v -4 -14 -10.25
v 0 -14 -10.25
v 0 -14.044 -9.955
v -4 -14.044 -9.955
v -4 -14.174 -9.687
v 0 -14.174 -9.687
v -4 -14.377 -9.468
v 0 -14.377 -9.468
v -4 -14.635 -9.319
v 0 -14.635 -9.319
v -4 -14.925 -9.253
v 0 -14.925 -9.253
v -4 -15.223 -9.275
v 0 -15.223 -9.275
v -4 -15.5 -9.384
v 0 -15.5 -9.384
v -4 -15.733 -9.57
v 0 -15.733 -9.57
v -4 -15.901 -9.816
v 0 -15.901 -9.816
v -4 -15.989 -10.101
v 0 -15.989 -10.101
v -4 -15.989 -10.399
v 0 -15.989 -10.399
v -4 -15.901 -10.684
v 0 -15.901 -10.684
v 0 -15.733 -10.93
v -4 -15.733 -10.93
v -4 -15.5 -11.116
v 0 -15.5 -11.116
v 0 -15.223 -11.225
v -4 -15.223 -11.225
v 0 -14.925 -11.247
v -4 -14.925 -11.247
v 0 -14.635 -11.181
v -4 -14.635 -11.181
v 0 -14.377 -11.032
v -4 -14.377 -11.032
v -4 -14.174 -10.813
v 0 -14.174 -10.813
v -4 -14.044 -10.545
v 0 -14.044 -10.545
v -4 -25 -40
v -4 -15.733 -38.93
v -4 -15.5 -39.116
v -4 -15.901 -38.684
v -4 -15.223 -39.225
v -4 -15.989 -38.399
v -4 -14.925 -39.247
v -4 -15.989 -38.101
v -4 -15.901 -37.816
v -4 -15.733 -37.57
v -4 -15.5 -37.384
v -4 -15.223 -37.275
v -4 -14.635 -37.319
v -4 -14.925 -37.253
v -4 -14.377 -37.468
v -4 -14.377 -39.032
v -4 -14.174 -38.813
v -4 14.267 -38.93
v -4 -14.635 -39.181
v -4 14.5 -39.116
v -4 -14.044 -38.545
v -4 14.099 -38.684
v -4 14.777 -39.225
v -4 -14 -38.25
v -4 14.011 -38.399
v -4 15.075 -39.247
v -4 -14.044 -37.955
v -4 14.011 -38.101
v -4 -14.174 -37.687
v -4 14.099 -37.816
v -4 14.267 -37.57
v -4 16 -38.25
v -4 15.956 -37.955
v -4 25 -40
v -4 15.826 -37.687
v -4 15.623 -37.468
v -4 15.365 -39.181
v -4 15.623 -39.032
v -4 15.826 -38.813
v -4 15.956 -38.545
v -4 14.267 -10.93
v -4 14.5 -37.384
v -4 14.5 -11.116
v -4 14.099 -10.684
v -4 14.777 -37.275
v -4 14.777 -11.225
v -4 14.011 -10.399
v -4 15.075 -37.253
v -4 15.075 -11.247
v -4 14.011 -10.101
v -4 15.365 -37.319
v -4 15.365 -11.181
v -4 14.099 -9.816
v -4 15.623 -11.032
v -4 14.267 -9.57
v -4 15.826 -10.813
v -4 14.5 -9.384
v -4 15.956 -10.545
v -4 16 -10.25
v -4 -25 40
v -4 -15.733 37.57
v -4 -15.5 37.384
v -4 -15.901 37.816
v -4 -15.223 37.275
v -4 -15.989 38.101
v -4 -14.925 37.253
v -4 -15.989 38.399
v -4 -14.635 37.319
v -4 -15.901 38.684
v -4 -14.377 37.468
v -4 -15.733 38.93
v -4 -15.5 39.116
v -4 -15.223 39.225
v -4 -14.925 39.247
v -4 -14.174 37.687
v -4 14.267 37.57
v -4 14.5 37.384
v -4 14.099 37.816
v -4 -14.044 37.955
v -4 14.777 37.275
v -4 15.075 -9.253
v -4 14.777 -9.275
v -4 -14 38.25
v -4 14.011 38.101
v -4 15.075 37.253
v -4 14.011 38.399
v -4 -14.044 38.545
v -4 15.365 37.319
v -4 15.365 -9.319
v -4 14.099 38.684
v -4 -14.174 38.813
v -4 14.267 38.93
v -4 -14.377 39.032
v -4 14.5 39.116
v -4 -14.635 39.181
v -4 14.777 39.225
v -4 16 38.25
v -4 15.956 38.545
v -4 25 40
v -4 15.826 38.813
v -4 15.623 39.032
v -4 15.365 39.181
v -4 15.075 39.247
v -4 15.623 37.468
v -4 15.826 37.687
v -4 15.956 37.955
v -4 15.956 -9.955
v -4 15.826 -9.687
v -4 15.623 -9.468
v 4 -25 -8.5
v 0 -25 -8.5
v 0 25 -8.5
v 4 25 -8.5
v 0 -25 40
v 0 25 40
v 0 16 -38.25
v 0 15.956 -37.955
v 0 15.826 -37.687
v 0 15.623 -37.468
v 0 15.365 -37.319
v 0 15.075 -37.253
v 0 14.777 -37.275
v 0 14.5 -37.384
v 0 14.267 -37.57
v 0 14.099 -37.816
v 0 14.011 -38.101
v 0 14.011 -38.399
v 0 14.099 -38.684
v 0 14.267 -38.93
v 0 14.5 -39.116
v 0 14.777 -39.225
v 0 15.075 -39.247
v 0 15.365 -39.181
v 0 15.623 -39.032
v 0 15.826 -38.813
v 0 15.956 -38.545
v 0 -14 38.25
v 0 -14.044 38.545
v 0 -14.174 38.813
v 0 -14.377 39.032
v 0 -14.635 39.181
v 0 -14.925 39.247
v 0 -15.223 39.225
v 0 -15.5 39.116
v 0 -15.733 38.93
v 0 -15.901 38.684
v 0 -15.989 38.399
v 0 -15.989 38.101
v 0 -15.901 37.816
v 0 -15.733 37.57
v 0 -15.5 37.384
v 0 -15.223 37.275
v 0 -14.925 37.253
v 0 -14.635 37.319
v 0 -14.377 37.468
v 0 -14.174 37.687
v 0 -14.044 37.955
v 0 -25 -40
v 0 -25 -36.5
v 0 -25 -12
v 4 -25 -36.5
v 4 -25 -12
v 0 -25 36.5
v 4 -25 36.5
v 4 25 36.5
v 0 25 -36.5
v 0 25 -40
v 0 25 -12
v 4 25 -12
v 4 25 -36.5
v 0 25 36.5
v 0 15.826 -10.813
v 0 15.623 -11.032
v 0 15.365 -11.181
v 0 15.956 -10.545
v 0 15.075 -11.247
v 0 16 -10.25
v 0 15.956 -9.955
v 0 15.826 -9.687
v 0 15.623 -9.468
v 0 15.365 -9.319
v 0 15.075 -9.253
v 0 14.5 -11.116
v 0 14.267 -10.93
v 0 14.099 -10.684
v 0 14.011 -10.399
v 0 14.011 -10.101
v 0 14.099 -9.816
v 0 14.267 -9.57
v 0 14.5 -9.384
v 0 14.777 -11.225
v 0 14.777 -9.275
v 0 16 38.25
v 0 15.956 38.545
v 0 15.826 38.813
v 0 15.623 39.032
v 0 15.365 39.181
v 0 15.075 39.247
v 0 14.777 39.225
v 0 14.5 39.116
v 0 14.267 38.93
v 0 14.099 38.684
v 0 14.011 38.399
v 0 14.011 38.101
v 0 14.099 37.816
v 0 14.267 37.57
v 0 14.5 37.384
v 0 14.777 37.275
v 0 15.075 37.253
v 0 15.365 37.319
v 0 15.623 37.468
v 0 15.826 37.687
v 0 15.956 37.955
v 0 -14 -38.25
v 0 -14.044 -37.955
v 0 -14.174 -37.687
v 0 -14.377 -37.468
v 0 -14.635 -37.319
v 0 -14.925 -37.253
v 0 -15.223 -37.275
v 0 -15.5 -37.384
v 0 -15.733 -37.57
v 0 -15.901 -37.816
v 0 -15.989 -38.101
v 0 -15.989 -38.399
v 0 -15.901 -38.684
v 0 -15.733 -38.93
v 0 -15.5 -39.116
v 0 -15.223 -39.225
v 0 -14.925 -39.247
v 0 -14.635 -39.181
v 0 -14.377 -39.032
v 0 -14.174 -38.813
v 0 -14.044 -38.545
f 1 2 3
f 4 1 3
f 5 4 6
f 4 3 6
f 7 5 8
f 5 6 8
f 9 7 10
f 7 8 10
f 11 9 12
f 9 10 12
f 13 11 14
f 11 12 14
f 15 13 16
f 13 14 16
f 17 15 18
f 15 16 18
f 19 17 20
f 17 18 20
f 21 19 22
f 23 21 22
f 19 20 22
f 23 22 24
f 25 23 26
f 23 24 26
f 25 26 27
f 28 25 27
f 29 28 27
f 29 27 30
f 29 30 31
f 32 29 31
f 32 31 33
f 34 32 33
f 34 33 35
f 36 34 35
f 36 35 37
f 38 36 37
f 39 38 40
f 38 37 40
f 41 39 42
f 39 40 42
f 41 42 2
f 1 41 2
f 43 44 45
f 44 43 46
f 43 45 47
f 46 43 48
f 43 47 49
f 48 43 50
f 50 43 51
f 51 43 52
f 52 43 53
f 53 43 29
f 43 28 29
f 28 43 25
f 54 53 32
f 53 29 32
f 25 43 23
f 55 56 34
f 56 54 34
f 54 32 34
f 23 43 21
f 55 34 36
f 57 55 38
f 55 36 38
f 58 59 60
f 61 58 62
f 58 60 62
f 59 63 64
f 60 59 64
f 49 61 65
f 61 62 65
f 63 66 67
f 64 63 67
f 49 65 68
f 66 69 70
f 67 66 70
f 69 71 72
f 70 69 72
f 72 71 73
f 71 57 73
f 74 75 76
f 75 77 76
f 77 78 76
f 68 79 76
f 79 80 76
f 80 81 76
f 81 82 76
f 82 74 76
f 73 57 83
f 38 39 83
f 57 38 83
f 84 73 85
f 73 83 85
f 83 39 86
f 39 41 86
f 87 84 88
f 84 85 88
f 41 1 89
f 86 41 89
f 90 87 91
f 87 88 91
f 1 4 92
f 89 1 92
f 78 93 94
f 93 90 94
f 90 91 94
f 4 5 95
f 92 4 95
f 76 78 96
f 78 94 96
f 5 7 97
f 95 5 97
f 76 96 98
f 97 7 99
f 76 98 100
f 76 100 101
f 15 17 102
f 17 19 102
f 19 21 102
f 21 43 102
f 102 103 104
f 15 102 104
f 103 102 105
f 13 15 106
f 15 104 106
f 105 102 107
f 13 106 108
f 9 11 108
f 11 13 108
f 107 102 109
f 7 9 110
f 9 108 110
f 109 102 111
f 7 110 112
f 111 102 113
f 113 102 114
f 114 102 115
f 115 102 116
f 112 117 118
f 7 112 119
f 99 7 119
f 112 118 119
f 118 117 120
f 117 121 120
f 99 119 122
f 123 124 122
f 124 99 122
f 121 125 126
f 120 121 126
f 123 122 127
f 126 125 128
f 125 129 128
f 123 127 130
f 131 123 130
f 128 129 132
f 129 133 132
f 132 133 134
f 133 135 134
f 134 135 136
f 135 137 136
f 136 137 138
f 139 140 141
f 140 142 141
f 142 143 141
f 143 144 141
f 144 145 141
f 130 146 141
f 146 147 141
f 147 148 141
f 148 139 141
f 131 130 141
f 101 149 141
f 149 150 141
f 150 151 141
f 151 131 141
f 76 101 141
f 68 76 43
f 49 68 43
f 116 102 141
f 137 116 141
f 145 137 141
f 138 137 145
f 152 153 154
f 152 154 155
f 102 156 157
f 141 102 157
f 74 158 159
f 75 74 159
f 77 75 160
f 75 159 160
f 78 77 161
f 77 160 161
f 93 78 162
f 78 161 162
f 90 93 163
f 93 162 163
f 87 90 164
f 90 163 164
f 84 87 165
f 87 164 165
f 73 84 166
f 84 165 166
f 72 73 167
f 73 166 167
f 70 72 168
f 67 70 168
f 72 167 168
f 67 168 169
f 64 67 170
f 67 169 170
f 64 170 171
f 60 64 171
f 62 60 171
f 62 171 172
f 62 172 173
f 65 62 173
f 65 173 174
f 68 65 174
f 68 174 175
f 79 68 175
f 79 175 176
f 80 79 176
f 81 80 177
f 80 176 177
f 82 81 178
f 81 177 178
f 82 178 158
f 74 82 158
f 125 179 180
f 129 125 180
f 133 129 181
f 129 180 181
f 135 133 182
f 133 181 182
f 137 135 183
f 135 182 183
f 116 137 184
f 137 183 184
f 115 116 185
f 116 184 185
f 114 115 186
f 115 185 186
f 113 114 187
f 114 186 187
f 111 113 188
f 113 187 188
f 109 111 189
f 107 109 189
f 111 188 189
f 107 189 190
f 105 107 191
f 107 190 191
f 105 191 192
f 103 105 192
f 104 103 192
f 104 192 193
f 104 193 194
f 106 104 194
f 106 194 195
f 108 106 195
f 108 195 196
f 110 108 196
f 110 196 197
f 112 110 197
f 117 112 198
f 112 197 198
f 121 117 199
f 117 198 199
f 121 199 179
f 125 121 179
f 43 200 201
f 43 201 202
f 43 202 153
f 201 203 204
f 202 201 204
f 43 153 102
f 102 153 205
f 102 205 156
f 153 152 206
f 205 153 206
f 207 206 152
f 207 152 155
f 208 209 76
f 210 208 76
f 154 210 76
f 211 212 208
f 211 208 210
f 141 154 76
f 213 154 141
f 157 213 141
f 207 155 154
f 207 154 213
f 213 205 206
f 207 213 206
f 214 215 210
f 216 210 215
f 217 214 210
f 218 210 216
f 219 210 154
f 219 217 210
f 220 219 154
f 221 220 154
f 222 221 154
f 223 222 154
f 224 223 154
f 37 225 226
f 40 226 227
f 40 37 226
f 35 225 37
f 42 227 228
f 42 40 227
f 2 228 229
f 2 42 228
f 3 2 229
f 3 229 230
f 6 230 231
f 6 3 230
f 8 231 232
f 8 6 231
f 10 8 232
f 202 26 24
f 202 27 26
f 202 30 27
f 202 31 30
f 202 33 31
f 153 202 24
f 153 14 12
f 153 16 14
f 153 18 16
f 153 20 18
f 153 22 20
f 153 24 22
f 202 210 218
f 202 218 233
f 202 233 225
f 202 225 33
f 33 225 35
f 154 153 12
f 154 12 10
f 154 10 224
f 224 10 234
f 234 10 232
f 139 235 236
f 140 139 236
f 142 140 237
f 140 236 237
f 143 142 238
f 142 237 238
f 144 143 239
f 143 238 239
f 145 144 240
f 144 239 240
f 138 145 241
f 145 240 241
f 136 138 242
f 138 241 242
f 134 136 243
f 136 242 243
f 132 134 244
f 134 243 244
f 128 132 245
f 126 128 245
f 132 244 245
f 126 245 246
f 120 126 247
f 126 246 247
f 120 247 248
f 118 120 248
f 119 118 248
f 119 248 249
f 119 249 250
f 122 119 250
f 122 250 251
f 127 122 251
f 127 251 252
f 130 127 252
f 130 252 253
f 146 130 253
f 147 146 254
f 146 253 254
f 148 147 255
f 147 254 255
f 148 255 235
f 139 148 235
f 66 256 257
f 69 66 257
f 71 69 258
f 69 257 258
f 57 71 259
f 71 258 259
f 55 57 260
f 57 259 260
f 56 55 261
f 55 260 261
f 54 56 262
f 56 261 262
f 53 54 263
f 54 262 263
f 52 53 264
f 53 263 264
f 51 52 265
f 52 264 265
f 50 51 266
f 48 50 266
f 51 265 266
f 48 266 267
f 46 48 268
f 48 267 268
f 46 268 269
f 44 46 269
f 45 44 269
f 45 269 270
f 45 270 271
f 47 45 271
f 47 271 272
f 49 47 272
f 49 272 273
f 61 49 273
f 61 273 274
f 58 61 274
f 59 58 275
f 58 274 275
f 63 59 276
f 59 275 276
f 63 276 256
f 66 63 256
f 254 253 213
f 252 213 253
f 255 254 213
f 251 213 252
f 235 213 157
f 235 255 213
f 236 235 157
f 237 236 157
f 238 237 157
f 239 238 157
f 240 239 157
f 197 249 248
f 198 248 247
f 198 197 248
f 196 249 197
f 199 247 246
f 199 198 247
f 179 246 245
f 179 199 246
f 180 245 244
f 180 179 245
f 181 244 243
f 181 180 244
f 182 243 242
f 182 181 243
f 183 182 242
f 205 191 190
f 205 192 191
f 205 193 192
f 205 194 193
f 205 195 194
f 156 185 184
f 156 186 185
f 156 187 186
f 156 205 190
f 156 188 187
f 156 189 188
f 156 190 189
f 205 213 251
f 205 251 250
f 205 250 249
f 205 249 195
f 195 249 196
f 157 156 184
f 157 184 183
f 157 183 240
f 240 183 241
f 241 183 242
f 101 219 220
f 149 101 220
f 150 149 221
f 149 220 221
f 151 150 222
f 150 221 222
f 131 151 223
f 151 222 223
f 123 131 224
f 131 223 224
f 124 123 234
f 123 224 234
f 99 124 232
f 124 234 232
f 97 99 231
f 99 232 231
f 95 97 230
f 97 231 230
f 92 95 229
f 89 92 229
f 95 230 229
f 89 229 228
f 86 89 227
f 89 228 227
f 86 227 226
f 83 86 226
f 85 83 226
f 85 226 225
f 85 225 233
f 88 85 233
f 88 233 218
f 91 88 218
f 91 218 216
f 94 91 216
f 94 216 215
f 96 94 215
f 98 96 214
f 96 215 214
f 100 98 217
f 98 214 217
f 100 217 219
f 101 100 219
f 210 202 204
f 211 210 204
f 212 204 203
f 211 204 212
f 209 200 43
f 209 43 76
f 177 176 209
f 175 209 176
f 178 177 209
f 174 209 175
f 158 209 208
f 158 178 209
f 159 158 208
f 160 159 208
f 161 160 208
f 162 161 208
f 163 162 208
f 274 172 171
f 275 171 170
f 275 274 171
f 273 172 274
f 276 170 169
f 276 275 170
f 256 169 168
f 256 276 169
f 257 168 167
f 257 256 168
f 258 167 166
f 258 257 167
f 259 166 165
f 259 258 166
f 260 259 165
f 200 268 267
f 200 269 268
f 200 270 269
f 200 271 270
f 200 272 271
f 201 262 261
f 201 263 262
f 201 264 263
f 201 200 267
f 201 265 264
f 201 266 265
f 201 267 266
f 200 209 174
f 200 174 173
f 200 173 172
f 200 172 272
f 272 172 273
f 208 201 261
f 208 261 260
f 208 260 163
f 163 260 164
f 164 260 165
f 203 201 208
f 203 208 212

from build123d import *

# Parameters (mm, degrees)
F0_W     = 50
F0_H     = 80
F1_DEPTH = 4
F2_W     = 4
F2_H     = 3.5
F3_DEPTH = 50.001
F4_R     = 1
F5_DEPTH = 4
F6_R     = 1
F7_DEPTH = 4
F8_R     = 1
F9_DEPTH = 4


with BuildPart() as f1:
    # F0 (on Right) → F1 (new body, symmetric)
    with BuildSketch(Plane.YZ):
        Rectangle(F0_W, F0_H)
    extrude(amount=F1_DEPTH, both=True)

    # F2 (on face) → F3 (cut, through all)
    with BuildSketch(Plane.XZ.offset(25)):
        with Locations((2, 38.25)):
            Rectangle(F2_W, F2_H)
        with Locations((2, -10.25)):
            Rectangle(F2_W, F2_H)
        with Locations((2, -38.25)):
            Rectangle(F2_W, F2_H)
    extrude(amount=-F3_DEPTH, mode=Mode.SUBTRACT)

    # F4 (on face) → F5 (cut, through all)
    with BuildSketch(Plane.YZ):
        with Locations((-15, 38.25)):
            Circle(F4_R)
        with Locations((15, 38.25)):
            Circle(F4_R)
    extrude(amount=-F5_DEPTH, mode=Mode.SUBTRACT)

    # F6 (on face) → F7 (cut, through all)
    with BuildSketch(Plane.YZ):
        with Locations((-15, -10.25)):
            Circle(F6_R)
        with Locations((15, -10.25)):
            Circle(F6_R)
    extrude(amount=-F7_DEPTH, mode=Mode.SUBTRACT)

    # F8 (on face) → F9 (cut, through all)
    with BuildSketch(Plane.YZ):
        with Locations((-15, -38.25)):
            Circle(F8_R)
        with Locations((15, -38.25)):
            Circle(F8_R)
    extrude(amount=-F9_DEPTH, mode=Mode.SUBTRACT)


solid = f1.part
